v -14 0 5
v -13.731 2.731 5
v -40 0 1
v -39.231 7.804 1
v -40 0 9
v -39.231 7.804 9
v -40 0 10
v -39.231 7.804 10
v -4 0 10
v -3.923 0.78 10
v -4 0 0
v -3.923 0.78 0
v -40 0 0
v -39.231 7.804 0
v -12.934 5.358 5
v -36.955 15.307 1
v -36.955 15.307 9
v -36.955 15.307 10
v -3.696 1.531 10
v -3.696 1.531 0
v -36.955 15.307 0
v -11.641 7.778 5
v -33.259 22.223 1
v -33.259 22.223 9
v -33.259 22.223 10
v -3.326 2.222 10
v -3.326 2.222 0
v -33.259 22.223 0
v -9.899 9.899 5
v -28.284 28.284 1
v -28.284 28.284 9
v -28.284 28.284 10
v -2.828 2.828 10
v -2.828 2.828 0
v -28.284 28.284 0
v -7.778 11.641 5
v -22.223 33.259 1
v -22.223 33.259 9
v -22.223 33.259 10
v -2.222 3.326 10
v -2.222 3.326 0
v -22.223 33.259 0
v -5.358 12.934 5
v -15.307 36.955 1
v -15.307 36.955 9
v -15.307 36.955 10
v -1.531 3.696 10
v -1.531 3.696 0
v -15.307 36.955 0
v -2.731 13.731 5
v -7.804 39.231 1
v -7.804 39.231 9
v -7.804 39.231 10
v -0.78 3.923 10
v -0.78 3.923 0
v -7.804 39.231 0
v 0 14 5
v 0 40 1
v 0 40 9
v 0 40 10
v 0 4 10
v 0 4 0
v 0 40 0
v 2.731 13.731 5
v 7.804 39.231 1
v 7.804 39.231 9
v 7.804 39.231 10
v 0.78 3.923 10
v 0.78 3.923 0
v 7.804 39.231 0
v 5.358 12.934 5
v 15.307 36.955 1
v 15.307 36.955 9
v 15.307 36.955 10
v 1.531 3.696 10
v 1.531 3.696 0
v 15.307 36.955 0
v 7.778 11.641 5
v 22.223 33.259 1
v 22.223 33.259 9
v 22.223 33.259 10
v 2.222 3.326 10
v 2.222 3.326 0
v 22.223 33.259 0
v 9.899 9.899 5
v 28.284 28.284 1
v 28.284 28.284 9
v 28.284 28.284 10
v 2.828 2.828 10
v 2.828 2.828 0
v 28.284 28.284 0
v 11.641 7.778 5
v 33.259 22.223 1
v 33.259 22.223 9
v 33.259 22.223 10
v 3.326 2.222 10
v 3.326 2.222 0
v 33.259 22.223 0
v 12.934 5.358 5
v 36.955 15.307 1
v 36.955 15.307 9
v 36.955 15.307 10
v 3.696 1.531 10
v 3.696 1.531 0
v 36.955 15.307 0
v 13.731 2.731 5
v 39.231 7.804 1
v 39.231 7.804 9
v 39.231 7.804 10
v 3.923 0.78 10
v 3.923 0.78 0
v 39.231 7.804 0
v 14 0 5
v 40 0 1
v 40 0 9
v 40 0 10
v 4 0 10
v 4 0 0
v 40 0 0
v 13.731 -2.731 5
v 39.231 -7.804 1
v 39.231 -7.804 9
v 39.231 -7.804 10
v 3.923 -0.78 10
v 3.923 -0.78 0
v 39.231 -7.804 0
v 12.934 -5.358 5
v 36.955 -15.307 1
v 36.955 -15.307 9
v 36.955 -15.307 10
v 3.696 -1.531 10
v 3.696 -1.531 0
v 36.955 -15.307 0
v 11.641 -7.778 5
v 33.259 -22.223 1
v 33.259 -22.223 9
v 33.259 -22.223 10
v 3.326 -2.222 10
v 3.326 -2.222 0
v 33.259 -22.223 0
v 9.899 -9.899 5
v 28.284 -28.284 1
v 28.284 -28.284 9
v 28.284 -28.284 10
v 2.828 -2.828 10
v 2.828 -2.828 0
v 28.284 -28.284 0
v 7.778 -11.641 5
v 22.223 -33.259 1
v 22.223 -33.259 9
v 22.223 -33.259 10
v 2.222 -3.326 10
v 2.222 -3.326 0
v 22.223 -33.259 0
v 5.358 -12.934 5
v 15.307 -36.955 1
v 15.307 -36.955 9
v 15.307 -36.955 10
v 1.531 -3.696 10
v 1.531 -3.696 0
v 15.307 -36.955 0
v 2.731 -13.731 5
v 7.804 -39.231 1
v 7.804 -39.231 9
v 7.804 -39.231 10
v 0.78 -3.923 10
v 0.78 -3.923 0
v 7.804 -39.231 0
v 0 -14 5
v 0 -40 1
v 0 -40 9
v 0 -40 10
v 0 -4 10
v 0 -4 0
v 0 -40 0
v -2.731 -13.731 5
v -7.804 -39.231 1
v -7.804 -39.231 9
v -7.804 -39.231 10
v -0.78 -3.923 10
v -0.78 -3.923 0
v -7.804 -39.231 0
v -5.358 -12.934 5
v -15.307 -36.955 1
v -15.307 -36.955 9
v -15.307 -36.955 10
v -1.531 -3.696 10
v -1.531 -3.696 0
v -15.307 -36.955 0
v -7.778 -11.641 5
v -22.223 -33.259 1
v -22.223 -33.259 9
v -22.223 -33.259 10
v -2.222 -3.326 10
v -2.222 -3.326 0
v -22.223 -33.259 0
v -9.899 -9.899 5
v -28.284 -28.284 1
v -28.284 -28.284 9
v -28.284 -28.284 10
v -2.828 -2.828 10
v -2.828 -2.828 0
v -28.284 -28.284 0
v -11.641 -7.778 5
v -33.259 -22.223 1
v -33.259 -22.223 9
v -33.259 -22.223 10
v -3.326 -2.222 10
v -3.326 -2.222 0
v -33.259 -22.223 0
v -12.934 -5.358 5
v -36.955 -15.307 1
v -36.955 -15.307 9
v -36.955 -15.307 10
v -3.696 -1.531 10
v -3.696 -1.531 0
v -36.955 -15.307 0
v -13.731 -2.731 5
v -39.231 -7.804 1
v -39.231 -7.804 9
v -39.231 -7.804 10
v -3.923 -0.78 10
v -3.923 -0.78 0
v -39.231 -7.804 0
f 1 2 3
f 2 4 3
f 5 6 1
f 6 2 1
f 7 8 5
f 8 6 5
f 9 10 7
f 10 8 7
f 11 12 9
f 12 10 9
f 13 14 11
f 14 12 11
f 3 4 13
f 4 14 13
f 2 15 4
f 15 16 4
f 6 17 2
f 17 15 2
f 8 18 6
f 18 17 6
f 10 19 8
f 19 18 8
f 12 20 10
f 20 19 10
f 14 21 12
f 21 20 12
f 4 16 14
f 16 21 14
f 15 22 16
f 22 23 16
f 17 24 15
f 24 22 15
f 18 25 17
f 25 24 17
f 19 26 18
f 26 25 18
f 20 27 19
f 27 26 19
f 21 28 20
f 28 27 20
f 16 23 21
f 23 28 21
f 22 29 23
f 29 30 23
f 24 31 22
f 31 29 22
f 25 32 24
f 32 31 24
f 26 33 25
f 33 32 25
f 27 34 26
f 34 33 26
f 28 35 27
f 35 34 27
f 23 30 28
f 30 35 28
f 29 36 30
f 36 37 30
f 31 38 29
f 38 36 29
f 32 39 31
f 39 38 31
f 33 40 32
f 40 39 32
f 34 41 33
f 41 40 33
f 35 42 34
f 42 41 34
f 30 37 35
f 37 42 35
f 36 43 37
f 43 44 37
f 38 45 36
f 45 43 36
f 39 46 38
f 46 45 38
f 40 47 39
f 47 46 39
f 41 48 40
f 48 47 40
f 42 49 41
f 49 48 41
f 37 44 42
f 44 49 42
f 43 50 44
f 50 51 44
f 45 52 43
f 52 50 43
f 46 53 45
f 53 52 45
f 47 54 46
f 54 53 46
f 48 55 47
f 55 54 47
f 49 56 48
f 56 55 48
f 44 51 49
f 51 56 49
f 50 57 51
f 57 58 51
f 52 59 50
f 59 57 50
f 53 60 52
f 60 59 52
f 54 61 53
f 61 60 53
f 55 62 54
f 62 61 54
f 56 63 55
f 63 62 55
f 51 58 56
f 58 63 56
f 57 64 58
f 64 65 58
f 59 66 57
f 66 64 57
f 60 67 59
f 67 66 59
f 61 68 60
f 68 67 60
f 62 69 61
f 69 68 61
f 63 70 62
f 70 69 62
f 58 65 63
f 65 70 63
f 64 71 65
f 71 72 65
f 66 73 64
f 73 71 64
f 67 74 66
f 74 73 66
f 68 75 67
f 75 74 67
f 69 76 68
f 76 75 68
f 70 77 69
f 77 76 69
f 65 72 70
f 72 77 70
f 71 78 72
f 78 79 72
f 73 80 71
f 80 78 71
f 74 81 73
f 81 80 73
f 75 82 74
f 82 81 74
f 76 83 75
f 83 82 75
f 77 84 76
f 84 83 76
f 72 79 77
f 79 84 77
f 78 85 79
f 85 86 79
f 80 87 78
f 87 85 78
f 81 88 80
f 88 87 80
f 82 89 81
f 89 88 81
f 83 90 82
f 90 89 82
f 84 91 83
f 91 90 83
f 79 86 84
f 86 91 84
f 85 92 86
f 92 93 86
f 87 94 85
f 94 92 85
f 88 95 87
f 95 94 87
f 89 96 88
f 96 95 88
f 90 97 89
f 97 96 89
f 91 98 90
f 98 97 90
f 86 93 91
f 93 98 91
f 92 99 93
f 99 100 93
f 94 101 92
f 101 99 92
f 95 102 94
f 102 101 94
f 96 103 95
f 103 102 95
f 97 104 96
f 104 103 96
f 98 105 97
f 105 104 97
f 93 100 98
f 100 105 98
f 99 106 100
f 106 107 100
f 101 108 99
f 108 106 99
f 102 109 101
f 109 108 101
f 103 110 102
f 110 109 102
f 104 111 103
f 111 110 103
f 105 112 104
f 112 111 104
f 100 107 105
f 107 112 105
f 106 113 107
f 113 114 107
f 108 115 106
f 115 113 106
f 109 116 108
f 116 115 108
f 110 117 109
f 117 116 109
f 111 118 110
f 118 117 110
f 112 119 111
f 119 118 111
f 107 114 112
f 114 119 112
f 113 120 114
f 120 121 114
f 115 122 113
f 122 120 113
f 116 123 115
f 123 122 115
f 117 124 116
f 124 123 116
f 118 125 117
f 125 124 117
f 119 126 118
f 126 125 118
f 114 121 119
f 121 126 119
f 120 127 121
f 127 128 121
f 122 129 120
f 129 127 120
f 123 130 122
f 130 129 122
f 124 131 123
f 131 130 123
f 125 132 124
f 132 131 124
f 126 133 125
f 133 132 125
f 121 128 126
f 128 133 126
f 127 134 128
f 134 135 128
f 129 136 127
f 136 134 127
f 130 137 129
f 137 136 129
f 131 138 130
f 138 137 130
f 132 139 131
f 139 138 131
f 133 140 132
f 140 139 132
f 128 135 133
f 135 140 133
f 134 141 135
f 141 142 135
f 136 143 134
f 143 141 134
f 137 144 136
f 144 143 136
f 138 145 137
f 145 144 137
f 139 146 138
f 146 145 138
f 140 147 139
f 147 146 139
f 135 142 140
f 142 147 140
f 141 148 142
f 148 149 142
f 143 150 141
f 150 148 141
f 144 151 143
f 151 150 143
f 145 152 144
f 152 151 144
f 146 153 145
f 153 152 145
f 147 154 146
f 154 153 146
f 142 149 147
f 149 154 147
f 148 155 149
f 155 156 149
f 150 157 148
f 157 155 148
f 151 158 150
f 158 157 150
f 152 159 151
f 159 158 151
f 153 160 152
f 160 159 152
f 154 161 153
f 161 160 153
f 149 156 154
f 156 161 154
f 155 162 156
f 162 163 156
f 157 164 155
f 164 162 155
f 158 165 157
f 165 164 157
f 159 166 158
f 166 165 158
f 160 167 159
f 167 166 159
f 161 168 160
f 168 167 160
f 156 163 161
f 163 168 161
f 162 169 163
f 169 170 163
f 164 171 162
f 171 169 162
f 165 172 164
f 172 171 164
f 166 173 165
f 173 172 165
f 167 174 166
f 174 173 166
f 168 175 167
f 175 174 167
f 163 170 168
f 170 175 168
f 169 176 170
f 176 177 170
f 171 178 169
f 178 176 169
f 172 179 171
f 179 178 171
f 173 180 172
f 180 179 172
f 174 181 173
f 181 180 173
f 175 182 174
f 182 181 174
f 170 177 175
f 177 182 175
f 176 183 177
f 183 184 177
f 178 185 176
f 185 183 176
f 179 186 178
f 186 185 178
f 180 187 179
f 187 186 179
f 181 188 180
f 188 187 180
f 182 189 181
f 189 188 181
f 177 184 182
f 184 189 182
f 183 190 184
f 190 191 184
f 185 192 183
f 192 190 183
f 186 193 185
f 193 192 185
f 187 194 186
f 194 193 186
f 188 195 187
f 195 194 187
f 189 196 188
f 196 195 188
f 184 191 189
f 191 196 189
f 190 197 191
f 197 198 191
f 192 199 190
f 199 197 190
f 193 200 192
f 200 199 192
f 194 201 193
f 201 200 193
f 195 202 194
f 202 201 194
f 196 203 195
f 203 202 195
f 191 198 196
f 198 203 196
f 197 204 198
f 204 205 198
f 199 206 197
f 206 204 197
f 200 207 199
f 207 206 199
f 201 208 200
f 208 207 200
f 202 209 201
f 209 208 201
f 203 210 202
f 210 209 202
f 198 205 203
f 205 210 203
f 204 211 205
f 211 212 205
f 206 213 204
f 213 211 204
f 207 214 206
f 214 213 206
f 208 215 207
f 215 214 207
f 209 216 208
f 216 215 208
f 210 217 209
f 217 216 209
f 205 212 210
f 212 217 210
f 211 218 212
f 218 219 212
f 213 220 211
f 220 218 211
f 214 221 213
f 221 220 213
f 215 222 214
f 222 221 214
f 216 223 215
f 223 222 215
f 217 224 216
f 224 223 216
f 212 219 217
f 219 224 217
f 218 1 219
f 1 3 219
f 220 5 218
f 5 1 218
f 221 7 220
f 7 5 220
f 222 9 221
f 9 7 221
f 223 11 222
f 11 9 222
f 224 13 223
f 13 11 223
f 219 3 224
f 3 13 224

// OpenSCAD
$fn = 32;

// ----------------------------------------------------------------------
// Revolved part: V-groove pulley R40
// ----------------------------------------------------------------------

// --- parameters (mm) ---
bore_r = 4;               // bore radius
rim_r = 40;               // rim radius
rim_t = 10;               // rim width
groove_r = 14;            // groove root radius
groove_w = 4;             // groove half width
revolve_angle = 360;      // revolve sweep, degrees

bore_d = 2 * bore_r;
rim_d = 2 * rim_r;
groove_d = 2 * groove_r;

profile = [[4, 0], [40, 0], [40, 1], [14, 5], [40, 9], [40, 10], [4, 10]];  // primary outline, 7 points, counter clockwise

// --- the one profile operation ---
rotate_extrude(angle = revolve_angle) polygon(points = profile);
